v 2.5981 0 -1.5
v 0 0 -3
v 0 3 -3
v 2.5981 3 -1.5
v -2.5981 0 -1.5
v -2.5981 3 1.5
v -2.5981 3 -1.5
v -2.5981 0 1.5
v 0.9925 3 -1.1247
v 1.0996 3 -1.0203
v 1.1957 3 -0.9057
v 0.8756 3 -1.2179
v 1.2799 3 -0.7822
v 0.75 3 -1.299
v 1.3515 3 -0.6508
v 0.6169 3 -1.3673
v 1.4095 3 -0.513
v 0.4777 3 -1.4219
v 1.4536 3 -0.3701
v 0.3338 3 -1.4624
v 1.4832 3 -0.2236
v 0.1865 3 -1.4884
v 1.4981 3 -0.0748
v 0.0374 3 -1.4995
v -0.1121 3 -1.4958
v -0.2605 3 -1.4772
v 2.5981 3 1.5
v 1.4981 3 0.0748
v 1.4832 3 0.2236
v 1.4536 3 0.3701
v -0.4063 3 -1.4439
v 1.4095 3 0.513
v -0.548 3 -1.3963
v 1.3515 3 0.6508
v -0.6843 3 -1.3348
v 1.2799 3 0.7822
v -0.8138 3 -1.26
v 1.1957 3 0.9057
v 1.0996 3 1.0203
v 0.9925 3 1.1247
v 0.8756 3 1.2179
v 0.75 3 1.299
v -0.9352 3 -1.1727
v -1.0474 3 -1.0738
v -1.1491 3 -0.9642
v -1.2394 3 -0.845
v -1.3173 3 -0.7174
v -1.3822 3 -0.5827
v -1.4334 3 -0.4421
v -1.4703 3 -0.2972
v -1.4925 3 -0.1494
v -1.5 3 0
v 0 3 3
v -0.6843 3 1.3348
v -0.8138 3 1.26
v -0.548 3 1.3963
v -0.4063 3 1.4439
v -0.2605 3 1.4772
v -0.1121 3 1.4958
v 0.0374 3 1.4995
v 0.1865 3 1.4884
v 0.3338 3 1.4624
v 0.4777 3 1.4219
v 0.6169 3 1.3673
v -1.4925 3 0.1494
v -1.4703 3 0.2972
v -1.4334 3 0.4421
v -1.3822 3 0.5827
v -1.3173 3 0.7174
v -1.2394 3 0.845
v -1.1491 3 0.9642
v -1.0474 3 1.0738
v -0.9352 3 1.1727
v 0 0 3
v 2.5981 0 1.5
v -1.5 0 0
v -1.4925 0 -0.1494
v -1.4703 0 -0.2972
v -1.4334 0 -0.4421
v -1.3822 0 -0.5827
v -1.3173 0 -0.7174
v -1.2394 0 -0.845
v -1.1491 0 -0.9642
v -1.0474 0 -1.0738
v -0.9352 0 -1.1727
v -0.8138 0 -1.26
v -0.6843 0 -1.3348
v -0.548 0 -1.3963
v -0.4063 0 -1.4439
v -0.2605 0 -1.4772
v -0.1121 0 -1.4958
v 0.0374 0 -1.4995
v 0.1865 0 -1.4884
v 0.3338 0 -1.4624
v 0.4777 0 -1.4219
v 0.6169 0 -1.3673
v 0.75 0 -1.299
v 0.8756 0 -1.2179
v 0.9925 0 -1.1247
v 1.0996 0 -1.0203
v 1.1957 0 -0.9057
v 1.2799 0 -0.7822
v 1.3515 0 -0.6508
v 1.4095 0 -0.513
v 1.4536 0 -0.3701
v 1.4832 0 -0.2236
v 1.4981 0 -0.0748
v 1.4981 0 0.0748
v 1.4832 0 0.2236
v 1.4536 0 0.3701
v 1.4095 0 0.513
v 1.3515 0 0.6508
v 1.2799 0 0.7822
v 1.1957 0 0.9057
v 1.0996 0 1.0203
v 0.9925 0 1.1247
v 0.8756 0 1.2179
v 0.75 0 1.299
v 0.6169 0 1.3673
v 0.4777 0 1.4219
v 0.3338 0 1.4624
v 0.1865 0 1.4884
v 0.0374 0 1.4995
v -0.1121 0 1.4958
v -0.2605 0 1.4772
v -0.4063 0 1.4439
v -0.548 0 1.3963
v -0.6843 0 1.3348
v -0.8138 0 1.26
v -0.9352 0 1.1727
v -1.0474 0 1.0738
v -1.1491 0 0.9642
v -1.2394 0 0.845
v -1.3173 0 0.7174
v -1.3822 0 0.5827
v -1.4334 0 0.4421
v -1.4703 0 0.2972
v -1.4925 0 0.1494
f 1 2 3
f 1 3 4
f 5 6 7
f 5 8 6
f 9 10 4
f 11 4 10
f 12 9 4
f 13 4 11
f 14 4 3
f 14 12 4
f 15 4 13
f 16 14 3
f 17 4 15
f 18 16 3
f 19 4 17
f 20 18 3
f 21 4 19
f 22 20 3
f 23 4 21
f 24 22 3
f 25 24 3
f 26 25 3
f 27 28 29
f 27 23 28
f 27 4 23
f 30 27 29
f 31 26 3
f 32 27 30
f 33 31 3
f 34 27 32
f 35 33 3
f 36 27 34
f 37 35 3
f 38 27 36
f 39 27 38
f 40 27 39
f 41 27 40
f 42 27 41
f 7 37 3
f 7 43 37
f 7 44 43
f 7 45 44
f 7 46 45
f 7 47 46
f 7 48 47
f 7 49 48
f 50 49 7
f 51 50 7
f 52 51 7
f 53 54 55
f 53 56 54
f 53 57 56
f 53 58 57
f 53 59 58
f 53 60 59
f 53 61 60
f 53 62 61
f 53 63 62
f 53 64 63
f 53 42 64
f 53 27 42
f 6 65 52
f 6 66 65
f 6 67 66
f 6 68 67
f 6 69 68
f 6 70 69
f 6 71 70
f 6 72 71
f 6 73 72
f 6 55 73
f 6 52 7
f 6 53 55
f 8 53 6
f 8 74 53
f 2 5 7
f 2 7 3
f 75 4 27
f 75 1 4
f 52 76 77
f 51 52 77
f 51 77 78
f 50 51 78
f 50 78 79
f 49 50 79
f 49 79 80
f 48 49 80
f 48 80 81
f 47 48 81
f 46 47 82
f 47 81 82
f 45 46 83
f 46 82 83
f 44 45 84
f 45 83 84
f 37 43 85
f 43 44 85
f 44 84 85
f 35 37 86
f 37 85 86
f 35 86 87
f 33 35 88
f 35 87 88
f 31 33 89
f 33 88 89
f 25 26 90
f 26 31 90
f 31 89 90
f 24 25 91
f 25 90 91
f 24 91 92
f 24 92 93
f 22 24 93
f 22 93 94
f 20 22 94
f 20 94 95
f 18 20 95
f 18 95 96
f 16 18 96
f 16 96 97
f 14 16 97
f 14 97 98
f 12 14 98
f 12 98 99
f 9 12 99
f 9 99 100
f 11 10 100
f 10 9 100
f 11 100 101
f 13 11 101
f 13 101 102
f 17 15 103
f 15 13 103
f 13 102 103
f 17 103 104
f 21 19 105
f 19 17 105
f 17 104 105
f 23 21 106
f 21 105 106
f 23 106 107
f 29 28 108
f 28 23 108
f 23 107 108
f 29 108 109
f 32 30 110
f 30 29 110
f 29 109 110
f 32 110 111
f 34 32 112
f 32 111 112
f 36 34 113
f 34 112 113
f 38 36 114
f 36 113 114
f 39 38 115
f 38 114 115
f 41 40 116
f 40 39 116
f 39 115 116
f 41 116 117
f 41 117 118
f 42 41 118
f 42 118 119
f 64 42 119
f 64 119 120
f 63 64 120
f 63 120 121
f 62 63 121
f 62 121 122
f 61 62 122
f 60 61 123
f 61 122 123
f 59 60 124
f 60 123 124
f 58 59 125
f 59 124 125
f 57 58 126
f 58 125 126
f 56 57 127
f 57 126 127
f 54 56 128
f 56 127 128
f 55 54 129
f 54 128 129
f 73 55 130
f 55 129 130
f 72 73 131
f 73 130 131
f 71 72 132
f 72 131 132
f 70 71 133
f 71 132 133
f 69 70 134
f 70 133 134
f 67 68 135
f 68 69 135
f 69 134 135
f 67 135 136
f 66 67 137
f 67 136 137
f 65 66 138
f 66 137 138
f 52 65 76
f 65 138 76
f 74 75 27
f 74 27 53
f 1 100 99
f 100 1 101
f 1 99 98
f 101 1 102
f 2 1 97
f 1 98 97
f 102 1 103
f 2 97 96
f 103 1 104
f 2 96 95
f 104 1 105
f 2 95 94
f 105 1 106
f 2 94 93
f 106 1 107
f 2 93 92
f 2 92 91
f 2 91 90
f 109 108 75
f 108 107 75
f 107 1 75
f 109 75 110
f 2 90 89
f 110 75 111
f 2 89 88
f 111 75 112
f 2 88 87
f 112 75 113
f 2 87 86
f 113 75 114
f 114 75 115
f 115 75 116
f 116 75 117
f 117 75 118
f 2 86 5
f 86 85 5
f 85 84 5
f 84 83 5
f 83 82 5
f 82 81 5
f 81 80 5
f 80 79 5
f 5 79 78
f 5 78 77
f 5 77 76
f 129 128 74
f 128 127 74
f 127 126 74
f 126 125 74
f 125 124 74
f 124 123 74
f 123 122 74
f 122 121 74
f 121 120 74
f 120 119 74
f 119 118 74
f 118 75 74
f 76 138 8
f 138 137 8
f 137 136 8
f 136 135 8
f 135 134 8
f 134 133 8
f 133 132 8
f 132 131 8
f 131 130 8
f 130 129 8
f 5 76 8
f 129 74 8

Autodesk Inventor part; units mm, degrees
ref_plane "YZ Plane" through (0, 0, 0) normal (1, 0, 0) x (0, 1, 0)
ref_plane "XZ Plane" through (0, 0, 0) normal (0, 1, 0) x (-1, 0, 0)
ref_plane "XY Plane" through (0, 0, 0) normal (0, 0, 1) x (1, 0, 0)
sketch "Sketch1" plane through (0, 0, 0) normal (0, 1, 0) x (-1, 0, 0)
  circle A0 centre (0, 0) radius 1.5
  line L0 (0, -3) -> (-2.5981, -1.5)
  line L1 (-2.5981, -1.5) -> (-2.5981, 1.5)
  line L2 (-2.5981, 1.5) -> (0, 3)
  line L3 (0, 3) -> (2.5981, 1.5)
  line L4 (2.5981, 1.5) -> (2.5981, -1.5)
  line L5 (2.5981, -1.5) -> (0, -3)
  dimension "d0" = 3
  dimension "d1" = 3
extrude "Extrusion1" add sketch "Sketch1" along normal blind 3
